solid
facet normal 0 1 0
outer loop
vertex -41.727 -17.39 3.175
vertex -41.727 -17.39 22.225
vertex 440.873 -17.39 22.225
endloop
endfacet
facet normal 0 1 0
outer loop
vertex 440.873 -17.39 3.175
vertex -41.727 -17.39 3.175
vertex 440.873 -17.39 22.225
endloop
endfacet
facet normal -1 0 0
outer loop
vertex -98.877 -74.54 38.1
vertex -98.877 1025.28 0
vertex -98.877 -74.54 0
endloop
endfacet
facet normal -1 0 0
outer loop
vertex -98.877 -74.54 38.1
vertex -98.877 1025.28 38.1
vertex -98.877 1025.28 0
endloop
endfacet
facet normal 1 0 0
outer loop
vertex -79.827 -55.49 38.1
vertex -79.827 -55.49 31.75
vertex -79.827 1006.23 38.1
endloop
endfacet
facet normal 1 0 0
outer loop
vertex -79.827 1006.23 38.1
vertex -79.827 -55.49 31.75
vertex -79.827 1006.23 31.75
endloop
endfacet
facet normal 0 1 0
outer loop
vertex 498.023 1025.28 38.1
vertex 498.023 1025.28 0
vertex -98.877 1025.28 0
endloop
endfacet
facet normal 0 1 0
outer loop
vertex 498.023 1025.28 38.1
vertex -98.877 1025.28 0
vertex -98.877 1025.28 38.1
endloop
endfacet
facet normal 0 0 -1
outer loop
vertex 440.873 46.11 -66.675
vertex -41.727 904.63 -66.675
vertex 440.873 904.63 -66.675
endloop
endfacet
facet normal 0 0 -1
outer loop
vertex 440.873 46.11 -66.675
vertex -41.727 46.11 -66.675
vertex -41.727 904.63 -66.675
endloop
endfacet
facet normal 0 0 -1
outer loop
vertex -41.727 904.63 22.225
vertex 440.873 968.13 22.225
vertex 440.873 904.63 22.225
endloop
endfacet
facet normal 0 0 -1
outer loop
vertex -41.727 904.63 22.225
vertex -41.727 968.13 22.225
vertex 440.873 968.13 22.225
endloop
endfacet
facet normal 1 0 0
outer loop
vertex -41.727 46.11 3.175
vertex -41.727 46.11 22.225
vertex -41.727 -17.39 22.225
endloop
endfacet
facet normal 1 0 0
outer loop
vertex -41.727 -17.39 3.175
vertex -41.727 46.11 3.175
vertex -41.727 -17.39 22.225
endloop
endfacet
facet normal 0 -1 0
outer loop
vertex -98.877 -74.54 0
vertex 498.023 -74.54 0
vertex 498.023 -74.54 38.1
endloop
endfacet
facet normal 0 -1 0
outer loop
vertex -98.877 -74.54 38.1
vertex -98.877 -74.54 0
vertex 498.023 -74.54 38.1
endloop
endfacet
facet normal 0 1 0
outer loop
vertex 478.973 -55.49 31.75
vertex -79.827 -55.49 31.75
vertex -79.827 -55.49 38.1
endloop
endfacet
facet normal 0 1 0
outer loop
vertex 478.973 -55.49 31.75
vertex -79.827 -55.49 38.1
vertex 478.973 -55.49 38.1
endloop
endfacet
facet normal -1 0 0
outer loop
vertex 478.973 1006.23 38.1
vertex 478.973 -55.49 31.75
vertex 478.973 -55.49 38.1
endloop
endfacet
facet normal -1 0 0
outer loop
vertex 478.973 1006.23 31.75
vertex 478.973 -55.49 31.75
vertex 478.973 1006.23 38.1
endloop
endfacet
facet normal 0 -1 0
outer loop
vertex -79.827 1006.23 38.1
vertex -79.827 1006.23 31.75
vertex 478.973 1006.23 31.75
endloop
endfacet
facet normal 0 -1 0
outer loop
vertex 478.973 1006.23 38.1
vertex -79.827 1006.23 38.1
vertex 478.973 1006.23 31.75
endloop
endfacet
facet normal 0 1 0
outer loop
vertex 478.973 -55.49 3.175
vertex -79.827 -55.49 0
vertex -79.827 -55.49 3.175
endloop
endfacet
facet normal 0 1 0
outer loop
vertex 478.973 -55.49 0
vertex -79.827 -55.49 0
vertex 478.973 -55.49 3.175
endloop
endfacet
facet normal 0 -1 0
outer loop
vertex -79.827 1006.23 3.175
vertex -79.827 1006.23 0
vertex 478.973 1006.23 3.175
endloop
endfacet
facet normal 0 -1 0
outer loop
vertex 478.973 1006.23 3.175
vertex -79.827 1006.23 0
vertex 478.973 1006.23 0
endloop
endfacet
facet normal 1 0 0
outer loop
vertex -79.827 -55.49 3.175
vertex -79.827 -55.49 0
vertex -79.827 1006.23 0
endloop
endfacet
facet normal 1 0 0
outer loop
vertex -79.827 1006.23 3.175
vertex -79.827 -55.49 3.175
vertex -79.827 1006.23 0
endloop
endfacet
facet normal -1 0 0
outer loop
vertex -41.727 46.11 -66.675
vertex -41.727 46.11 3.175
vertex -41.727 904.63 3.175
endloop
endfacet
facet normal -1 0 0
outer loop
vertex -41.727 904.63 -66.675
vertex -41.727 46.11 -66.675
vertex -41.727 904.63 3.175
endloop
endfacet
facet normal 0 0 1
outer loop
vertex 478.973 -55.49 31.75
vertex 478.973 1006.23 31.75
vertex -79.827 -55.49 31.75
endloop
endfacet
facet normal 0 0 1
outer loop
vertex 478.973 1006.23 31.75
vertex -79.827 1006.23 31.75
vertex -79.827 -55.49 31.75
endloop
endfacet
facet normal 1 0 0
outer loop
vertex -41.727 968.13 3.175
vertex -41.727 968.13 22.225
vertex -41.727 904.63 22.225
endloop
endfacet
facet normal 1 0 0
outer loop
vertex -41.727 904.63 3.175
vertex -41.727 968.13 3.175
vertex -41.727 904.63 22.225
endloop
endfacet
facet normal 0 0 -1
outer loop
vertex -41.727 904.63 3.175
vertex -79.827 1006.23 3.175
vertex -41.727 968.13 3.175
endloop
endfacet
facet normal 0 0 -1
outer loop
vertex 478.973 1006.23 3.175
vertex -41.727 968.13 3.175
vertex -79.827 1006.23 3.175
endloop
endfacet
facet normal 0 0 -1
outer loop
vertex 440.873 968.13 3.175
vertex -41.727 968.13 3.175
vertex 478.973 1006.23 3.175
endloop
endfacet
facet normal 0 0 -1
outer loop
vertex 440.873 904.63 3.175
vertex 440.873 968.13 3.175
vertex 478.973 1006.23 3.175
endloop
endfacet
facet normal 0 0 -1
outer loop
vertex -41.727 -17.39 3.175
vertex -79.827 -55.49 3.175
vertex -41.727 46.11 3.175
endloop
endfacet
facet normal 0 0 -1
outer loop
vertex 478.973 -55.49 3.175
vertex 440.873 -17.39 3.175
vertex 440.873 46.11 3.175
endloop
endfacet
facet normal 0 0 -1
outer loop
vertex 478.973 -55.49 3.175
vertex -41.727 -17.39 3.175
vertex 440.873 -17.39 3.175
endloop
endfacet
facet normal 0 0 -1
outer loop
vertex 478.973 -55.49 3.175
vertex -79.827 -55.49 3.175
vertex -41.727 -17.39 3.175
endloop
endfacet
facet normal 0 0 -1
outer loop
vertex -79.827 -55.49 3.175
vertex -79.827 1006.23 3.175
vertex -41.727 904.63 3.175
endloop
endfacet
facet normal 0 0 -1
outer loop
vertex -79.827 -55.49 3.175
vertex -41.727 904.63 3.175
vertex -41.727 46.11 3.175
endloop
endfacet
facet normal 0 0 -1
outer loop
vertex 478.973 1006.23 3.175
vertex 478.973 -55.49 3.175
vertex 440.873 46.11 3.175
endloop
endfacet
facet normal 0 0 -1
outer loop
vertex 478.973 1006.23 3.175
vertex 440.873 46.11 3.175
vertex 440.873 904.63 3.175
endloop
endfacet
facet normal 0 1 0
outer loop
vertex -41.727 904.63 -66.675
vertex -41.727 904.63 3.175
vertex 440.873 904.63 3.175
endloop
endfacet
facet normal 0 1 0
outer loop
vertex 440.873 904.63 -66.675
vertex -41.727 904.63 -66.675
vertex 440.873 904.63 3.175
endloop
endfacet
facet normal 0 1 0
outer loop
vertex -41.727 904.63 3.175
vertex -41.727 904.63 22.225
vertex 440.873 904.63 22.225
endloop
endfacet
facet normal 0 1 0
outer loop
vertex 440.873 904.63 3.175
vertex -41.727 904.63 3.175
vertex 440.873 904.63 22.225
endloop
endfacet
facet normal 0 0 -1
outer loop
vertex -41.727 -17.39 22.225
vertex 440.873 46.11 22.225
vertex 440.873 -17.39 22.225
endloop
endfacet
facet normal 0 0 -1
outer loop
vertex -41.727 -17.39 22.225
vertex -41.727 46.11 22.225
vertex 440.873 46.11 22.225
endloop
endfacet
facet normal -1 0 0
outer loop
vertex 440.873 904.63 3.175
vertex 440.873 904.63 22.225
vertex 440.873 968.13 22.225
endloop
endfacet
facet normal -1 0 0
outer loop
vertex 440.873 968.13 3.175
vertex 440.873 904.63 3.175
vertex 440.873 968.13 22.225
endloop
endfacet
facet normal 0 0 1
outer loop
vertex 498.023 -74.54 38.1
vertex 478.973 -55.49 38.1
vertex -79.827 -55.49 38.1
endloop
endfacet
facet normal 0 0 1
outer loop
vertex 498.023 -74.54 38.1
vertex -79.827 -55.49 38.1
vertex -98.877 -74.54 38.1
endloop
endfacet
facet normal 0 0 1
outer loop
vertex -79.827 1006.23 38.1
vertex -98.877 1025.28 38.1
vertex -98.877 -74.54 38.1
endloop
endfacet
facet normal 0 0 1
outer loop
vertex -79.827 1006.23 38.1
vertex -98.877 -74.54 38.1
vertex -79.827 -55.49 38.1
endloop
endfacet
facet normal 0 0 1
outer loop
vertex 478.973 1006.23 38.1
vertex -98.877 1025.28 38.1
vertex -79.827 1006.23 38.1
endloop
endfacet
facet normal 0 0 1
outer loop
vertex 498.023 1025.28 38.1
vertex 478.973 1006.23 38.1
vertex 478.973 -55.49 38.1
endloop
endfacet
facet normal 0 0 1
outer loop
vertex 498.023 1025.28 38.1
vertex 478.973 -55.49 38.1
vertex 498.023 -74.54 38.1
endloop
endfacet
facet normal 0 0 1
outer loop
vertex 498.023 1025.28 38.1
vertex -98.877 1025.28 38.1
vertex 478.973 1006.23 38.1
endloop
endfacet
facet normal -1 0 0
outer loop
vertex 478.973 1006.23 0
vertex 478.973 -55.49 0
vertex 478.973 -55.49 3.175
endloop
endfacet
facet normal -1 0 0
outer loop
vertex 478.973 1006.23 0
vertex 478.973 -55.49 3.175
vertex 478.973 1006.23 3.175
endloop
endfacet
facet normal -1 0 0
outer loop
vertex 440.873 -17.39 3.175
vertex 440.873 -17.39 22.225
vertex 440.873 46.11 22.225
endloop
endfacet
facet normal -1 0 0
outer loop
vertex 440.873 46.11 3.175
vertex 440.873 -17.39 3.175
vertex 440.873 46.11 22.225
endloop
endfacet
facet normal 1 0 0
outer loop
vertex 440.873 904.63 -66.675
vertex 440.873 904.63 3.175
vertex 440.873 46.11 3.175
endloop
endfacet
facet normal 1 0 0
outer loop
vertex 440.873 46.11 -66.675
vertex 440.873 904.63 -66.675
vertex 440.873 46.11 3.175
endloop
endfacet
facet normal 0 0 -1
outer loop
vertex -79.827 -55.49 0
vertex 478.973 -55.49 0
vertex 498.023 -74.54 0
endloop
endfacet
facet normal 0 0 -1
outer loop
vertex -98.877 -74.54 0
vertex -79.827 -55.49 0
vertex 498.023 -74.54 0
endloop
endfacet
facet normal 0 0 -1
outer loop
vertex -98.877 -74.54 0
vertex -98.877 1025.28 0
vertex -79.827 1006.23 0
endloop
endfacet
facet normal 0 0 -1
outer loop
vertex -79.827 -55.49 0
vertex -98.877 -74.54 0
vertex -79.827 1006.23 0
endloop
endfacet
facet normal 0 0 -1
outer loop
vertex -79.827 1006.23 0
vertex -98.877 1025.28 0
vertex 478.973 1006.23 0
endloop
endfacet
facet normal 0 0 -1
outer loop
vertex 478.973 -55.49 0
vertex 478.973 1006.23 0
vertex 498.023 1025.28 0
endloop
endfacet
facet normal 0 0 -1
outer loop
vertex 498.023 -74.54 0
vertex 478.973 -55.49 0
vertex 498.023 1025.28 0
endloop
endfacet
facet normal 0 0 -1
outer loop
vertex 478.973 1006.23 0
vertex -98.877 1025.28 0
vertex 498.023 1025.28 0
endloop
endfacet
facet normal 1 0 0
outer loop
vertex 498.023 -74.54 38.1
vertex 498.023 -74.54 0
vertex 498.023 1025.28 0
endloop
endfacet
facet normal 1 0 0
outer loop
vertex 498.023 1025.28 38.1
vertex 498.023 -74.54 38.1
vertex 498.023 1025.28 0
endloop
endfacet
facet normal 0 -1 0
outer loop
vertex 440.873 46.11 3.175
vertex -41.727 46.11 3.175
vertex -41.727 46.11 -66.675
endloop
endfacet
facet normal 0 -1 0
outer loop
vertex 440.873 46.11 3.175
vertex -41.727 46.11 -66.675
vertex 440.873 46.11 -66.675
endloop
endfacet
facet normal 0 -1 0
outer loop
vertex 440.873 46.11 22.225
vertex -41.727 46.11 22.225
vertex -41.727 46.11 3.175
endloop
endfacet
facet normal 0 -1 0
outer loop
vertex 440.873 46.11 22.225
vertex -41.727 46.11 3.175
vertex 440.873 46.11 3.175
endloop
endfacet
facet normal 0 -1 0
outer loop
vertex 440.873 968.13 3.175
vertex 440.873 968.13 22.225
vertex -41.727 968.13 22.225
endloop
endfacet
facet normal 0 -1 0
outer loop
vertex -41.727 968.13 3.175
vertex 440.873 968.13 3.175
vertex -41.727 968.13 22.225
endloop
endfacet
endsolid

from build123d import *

# Parameters (mm, degrees)
F0_W     = 596.9
F0_H     = 1099.82
F0_W_2   = 558.8
F0_H_2   = 1061.72
F1_DEPTH = 38.1
F2_W     = 1099.82
F2_H     = 9.525
F3_DEPTH = 584.2
F4_W     = 558.8
F4_H     = 1061.72
F5_DEPTH = 19.05
F6_W     = 482.6
F6_H     = 38.1
F6_H_2   = 782.32
F7_DEPTH = 88.9


with BuildPart() as f1:
    # F0 (on Top) → F1 (new body)
    with BuildSketch(Plane.XY):
        with Locations((199.572543, 475.369852)):
            Rectangle(F0_W, F0_H)
        with Locations((199.572543, 475.369852)):
            Rectangle(F0_W_2, F0_H_2, mode=Mode.SUBTRACT)
    extrude(amount=F1_DEPTH)

    # F2 (on face) → F3 (join)
    with BuildSketch(Plane(origin=(-98.877457, 0, 0), x_dir=(0, -1, 0), z_dir=(-1, 0, 0))):
        with Locations((-475.369852, 26.9875)):
            Rectangle(F2_W, F2_H)
    extrude(amount=-F3_DEPTH)

    # F4 (on face) → F5 (join)
    with BuildSketch(Plane(origin=(0, 0, 22.225), x_dir=(1, 0, 0), z_dir=(0, 0, -1))):
        with Locations((199.572543, -475.369852)):
            Rectangle(F4_W, F4_H)
        Polygon((440.872543, -968.129852), (-41.727457, -968.129852), (-41.727457, -904.629852), (-41.727457, -866.529852), (-41.727457, -84.209852), (-41.727457, -46.109852), (-41.727457, 17.390148), (440.872543, 17.390148), (440.872543, -46.109852), (440.872543, -84.209852), (440.872543, -866.529852), (440.872543, -904.629852), align=None, mode=Mode.SUBTRACT)
    extrude(amount=F5_DEPTH)

    # F6 (on face) → F7 (join)
    with BuildSketch(Plane(origin=(0, 0, 22.225), x_dir=(1, 0, 0), z_dir=(0, 0, -1))):
        with Locations((199.572543, -885.579852)):
            Rectangle(F6_W, F6_H)
        with Locations((199.572543, -65.159852)):
            Rectangle(F6_W, F6_H)
        with Locations((199.572543, -475.369852)):
            Rectangle(F6_W, F6_H_2)
    extrude(amount=F7_DEPTH)


solid = f1.part
